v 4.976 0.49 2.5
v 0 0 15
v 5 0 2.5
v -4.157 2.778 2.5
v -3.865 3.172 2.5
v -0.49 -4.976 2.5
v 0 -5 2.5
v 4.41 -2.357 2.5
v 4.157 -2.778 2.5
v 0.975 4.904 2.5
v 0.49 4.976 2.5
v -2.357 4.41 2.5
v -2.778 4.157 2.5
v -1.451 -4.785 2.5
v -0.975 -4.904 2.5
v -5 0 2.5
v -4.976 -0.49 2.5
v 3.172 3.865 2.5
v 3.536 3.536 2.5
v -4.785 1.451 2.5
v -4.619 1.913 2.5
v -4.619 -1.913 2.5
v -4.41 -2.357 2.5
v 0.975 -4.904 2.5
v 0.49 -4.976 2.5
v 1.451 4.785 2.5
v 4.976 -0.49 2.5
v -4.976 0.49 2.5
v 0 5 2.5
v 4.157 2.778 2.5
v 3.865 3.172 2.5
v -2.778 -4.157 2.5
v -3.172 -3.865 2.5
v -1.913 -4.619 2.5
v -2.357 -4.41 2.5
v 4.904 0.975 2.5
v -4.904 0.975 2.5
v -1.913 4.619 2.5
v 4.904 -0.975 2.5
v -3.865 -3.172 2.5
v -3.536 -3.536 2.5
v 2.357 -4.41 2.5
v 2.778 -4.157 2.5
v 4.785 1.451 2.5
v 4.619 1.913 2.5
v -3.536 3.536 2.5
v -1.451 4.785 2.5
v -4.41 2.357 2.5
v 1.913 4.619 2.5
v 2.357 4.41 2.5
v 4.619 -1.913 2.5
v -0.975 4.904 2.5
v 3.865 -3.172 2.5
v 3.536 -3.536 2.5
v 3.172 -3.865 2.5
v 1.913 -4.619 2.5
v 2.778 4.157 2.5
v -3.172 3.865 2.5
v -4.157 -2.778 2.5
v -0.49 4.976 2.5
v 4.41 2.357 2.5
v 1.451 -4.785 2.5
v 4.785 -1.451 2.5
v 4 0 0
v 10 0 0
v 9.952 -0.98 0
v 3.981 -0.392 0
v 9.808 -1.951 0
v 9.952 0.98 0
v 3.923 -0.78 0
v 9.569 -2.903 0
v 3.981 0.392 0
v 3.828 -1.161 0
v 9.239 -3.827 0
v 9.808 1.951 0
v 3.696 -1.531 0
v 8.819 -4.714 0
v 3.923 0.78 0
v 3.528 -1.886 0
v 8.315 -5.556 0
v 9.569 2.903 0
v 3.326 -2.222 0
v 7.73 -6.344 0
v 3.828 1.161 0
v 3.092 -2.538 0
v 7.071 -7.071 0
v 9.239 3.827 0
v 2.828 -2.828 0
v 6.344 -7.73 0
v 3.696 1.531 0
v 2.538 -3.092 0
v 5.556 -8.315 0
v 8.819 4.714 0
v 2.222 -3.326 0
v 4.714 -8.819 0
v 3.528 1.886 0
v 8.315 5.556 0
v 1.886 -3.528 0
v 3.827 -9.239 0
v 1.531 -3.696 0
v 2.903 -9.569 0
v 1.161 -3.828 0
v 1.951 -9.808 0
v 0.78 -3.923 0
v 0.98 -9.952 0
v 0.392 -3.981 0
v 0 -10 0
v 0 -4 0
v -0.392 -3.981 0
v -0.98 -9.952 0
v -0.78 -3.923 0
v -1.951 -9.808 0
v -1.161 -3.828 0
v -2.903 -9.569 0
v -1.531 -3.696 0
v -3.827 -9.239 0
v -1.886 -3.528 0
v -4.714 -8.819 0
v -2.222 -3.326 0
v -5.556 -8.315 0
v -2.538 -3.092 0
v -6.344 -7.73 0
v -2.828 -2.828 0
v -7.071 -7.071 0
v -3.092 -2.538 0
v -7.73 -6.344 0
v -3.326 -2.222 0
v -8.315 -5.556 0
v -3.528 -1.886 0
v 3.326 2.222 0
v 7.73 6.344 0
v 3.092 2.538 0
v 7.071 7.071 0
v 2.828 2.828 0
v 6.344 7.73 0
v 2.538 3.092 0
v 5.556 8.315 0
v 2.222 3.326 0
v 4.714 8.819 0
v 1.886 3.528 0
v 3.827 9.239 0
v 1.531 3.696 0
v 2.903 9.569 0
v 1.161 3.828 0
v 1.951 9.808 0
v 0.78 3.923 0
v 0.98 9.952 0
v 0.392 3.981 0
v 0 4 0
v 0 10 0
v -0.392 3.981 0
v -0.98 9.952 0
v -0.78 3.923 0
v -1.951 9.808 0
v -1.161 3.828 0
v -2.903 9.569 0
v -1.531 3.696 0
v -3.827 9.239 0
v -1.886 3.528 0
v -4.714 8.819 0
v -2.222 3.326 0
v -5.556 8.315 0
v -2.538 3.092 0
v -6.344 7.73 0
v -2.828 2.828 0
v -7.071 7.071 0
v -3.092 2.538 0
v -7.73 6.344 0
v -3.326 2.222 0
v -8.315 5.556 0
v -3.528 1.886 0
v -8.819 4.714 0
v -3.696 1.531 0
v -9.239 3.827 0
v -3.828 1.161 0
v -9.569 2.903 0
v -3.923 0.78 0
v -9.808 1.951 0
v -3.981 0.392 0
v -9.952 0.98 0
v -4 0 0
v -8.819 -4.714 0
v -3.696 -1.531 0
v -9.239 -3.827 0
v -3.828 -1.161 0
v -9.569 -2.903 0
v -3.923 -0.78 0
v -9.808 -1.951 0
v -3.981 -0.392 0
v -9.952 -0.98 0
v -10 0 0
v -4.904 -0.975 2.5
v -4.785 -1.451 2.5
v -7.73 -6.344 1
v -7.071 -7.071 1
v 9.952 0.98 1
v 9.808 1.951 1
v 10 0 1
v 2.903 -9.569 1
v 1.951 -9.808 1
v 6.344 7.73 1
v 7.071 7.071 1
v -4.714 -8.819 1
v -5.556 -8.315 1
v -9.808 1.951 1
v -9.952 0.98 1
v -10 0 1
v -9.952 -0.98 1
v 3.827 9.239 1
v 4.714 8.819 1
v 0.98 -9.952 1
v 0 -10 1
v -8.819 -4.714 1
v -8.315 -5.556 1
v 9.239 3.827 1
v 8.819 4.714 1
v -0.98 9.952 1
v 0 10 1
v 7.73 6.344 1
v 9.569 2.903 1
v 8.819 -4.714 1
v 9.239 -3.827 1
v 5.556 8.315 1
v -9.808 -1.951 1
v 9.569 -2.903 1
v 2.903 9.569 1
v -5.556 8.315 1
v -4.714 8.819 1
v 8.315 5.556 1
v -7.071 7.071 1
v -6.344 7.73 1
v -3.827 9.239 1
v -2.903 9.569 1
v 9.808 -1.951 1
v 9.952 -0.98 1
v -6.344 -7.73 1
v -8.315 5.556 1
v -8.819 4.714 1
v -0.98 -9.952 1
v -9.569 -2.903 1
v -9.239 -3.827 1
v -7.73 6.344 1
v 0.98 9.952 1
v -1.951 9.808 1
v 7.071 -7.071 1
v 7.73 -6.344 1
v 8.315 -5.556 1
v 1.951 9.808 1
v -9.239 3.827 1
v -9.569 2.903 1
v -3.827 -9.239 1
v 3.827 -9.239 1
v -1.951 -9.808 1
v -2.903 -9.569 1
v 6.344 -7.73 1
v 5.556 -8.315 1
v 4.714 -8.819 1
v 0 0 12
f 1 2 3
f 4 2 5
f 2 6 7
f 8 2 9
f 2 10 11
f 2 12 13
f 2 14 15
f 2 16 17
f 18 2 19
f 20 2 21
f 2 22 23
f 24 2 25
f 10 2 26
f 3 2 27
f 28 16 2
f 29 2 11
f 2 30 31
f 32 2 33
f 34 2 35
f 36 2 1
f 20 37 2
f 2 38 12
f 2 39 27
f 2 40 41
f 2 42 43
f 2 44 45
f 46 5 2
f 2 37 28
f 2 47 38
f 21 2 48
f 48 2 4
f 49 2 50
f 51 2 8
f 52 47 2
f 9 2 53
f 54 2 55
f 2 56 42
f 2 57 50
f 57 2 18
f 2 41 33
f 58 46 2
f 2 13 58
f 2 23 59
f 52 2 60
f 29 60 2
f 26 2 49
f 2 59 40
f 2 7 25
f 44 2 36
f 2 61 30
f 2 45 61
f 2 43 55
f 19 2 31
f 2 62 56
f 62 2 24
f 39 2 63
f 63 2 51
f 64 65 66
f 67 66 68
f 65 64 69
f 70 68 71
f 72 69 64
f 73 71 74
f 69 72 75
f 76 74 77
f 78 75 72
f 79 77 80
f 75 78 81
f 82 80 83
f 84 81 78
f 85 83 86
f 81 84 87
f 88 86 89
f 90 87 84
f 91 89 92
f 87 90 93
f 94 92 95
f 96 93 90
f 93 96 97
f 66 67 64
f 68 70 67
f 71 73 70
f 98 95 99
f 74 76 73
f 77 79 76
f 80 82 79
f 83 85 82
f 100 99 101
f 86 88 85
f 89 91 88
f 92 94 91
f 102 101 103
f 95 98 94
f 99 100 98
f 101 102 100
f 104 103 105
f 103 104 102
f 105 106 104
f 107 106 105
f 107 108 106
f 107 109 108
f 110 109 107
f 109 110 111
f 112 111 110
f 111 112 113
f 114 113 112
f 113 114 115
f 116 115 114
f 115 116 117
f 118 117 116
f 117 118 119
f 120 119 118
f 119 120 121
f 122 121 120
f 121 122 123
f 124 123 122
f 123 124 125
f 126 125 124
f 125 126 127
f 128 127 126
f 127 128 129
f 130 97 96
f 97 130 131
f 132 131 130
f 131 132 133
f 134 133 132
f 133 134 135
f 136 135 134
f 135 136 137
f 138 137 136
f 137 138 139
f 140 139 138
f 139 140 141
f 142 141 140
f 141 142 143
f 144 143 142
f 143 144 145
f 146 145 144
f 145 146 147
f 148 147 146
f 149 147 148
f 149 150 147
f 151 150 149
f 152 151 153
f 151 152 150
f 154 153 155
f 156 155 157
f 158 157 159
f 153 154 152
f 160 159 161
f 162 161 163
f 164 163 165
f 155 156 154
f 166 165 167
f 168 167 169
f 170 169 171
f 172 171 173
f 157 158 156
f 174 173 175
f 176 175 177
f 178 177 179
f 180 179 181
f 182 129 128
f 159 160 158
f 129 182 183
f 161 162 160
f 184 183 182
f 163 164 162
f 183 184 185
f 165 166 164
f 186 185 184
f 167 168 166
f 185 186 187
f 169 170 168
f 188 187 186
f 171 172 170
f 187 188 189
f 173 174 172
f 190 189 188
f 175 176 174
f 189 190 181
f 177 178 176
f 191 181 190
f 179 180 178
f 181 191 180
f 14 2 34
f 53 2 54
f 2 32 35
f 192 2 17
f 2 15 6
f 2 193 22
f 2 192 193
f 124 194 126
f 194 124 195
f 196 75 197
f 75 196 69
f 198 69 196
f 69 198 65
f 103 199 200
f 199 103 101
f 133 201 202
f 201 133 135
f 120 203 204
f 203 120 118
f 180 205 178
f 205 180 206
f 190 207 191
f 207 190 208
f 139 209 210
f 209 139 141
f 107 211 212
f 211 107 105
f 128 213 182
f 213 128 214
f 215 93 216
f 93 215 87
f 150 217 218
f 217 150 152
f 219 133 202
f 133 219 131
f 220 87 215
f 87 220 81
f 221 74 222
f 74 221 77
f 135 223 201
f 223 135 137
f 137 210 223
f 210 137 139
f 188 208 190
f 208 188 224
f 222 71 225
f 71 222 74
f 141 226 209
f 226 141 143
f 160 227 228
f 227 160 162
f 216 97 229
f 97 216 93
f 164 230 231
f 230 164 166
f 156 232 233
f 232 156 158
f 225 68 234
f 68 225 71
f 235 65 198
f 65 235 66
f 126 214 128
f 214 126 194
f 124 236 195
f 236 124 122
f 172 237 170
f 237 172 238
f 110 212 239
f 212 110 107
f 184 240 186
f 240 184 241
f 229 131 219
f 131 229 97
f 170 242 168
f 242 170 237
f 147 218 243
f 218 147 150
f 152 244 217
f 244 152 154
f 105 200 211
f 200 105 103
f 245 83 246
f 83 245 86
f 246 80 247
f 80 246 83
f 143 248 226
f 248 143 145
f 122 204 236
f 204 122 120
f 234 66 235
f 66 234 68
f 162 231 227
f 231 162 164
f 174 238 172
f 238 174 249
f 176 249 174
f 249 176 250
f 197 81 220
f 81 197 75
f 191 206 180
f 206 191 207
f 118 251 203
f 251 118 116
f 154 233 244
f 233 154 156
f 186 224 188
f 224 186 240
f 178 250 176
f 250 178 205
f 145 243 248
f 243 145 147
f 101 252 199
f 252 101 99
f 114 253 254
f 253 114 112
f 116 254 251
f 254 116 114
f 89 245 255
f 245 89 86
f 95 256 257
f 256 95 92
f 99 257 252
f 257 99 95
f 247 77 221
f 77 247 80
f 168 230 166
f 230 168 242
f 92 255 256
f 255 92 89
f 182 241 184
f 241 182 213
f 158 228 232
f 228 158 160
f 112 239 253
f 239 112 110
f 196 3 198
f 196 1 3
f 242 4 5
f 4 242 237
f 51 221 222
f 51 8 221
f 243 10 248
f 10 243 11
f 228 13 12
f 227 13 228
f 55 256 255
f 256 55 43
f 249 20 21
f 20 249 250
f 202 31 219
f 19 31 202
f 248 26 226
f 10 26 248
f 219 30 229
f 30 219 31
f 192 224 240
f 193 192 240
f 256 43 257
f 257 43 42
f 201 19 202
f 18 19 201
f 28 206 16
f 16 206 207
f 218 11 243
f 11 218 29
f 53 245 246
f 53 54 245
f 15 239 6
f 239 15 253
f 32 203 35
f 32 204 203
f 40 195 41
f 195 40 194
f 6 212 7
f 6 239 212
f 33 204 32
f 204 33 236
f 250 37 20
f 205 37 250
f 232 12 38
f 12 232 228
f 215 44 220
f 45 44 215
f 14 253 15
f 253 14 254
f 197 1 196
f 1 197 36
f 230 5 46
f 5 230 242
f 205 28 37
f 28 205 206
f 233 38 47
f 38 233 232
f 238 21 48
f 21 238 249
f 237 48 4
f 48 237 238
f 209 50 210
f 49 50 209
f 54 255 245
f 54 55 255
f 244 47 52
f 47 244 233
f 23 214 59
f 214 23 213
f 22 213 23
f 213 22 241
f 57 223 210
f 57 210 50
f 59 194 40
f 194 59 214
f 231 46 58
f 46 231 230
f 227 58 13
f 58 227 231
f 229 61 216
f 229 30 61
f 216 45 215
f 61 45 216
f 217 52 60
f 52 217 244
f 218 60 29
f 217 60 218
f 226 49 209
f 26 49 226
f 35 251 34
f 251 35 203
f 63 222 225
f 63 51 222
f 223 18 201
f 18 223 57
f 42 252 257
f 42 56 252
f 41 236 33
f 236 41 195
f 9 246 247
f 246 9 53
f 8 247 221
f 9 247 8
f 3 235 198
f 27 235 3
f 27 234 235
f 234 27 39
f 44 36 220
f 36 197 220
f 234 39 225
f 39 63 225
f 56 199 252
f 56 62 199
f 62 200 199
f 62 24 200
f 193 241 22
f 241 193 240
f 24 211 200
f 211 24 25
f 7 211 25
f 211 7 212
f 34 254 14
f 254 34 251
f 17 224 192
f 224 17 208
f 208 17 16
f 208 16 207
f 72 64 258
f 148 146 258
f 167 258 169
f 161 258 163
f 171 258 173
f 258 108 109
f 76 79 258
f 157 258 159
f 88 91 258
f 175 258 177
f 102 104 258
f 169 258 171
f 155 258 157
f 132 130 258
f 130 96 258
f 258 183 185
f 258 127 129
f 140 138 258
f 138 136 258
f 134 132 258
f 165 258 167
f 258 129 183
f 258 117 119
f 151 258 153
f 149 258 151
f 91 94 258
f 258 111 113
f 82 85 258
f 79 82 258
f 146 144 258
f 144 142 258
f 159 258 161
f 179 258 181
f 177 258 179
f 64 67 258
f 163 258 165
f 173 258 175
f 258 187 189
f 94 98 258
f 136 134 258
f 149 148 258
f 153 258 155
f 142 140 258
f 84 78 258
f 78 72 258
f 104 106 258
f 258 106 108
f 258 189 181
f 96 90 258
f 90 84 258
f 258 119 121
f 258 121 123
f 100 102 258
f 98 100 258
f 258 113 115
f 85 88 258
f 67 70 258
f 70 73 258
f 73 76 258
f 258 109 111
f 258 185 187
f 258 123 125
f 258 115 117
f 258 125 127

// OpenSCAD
$fn = 64;

inner_diameter = 8;
outer_diameter = 12;
brim_diameter = 20;

inner_height = 12;
outer_height = 15;
inner_brim_height = 3;
outer_brim_height = 1;

difference() {
    union() {
        cylinder(h=outer_height, d1=outer_diameter, d2=0);
        cylinder(h=outer_brim_height, d=brim_diameter);
        translate([0,0,outer_brim_height]) {
            cylinder(h=inner_brim_height, d1=brim_diameter, d2=outer_diameter-inner_brim_height*4);
        }
    }
    cylinder(h=inner_height, d1=inner_diameter, d2=0);
}
